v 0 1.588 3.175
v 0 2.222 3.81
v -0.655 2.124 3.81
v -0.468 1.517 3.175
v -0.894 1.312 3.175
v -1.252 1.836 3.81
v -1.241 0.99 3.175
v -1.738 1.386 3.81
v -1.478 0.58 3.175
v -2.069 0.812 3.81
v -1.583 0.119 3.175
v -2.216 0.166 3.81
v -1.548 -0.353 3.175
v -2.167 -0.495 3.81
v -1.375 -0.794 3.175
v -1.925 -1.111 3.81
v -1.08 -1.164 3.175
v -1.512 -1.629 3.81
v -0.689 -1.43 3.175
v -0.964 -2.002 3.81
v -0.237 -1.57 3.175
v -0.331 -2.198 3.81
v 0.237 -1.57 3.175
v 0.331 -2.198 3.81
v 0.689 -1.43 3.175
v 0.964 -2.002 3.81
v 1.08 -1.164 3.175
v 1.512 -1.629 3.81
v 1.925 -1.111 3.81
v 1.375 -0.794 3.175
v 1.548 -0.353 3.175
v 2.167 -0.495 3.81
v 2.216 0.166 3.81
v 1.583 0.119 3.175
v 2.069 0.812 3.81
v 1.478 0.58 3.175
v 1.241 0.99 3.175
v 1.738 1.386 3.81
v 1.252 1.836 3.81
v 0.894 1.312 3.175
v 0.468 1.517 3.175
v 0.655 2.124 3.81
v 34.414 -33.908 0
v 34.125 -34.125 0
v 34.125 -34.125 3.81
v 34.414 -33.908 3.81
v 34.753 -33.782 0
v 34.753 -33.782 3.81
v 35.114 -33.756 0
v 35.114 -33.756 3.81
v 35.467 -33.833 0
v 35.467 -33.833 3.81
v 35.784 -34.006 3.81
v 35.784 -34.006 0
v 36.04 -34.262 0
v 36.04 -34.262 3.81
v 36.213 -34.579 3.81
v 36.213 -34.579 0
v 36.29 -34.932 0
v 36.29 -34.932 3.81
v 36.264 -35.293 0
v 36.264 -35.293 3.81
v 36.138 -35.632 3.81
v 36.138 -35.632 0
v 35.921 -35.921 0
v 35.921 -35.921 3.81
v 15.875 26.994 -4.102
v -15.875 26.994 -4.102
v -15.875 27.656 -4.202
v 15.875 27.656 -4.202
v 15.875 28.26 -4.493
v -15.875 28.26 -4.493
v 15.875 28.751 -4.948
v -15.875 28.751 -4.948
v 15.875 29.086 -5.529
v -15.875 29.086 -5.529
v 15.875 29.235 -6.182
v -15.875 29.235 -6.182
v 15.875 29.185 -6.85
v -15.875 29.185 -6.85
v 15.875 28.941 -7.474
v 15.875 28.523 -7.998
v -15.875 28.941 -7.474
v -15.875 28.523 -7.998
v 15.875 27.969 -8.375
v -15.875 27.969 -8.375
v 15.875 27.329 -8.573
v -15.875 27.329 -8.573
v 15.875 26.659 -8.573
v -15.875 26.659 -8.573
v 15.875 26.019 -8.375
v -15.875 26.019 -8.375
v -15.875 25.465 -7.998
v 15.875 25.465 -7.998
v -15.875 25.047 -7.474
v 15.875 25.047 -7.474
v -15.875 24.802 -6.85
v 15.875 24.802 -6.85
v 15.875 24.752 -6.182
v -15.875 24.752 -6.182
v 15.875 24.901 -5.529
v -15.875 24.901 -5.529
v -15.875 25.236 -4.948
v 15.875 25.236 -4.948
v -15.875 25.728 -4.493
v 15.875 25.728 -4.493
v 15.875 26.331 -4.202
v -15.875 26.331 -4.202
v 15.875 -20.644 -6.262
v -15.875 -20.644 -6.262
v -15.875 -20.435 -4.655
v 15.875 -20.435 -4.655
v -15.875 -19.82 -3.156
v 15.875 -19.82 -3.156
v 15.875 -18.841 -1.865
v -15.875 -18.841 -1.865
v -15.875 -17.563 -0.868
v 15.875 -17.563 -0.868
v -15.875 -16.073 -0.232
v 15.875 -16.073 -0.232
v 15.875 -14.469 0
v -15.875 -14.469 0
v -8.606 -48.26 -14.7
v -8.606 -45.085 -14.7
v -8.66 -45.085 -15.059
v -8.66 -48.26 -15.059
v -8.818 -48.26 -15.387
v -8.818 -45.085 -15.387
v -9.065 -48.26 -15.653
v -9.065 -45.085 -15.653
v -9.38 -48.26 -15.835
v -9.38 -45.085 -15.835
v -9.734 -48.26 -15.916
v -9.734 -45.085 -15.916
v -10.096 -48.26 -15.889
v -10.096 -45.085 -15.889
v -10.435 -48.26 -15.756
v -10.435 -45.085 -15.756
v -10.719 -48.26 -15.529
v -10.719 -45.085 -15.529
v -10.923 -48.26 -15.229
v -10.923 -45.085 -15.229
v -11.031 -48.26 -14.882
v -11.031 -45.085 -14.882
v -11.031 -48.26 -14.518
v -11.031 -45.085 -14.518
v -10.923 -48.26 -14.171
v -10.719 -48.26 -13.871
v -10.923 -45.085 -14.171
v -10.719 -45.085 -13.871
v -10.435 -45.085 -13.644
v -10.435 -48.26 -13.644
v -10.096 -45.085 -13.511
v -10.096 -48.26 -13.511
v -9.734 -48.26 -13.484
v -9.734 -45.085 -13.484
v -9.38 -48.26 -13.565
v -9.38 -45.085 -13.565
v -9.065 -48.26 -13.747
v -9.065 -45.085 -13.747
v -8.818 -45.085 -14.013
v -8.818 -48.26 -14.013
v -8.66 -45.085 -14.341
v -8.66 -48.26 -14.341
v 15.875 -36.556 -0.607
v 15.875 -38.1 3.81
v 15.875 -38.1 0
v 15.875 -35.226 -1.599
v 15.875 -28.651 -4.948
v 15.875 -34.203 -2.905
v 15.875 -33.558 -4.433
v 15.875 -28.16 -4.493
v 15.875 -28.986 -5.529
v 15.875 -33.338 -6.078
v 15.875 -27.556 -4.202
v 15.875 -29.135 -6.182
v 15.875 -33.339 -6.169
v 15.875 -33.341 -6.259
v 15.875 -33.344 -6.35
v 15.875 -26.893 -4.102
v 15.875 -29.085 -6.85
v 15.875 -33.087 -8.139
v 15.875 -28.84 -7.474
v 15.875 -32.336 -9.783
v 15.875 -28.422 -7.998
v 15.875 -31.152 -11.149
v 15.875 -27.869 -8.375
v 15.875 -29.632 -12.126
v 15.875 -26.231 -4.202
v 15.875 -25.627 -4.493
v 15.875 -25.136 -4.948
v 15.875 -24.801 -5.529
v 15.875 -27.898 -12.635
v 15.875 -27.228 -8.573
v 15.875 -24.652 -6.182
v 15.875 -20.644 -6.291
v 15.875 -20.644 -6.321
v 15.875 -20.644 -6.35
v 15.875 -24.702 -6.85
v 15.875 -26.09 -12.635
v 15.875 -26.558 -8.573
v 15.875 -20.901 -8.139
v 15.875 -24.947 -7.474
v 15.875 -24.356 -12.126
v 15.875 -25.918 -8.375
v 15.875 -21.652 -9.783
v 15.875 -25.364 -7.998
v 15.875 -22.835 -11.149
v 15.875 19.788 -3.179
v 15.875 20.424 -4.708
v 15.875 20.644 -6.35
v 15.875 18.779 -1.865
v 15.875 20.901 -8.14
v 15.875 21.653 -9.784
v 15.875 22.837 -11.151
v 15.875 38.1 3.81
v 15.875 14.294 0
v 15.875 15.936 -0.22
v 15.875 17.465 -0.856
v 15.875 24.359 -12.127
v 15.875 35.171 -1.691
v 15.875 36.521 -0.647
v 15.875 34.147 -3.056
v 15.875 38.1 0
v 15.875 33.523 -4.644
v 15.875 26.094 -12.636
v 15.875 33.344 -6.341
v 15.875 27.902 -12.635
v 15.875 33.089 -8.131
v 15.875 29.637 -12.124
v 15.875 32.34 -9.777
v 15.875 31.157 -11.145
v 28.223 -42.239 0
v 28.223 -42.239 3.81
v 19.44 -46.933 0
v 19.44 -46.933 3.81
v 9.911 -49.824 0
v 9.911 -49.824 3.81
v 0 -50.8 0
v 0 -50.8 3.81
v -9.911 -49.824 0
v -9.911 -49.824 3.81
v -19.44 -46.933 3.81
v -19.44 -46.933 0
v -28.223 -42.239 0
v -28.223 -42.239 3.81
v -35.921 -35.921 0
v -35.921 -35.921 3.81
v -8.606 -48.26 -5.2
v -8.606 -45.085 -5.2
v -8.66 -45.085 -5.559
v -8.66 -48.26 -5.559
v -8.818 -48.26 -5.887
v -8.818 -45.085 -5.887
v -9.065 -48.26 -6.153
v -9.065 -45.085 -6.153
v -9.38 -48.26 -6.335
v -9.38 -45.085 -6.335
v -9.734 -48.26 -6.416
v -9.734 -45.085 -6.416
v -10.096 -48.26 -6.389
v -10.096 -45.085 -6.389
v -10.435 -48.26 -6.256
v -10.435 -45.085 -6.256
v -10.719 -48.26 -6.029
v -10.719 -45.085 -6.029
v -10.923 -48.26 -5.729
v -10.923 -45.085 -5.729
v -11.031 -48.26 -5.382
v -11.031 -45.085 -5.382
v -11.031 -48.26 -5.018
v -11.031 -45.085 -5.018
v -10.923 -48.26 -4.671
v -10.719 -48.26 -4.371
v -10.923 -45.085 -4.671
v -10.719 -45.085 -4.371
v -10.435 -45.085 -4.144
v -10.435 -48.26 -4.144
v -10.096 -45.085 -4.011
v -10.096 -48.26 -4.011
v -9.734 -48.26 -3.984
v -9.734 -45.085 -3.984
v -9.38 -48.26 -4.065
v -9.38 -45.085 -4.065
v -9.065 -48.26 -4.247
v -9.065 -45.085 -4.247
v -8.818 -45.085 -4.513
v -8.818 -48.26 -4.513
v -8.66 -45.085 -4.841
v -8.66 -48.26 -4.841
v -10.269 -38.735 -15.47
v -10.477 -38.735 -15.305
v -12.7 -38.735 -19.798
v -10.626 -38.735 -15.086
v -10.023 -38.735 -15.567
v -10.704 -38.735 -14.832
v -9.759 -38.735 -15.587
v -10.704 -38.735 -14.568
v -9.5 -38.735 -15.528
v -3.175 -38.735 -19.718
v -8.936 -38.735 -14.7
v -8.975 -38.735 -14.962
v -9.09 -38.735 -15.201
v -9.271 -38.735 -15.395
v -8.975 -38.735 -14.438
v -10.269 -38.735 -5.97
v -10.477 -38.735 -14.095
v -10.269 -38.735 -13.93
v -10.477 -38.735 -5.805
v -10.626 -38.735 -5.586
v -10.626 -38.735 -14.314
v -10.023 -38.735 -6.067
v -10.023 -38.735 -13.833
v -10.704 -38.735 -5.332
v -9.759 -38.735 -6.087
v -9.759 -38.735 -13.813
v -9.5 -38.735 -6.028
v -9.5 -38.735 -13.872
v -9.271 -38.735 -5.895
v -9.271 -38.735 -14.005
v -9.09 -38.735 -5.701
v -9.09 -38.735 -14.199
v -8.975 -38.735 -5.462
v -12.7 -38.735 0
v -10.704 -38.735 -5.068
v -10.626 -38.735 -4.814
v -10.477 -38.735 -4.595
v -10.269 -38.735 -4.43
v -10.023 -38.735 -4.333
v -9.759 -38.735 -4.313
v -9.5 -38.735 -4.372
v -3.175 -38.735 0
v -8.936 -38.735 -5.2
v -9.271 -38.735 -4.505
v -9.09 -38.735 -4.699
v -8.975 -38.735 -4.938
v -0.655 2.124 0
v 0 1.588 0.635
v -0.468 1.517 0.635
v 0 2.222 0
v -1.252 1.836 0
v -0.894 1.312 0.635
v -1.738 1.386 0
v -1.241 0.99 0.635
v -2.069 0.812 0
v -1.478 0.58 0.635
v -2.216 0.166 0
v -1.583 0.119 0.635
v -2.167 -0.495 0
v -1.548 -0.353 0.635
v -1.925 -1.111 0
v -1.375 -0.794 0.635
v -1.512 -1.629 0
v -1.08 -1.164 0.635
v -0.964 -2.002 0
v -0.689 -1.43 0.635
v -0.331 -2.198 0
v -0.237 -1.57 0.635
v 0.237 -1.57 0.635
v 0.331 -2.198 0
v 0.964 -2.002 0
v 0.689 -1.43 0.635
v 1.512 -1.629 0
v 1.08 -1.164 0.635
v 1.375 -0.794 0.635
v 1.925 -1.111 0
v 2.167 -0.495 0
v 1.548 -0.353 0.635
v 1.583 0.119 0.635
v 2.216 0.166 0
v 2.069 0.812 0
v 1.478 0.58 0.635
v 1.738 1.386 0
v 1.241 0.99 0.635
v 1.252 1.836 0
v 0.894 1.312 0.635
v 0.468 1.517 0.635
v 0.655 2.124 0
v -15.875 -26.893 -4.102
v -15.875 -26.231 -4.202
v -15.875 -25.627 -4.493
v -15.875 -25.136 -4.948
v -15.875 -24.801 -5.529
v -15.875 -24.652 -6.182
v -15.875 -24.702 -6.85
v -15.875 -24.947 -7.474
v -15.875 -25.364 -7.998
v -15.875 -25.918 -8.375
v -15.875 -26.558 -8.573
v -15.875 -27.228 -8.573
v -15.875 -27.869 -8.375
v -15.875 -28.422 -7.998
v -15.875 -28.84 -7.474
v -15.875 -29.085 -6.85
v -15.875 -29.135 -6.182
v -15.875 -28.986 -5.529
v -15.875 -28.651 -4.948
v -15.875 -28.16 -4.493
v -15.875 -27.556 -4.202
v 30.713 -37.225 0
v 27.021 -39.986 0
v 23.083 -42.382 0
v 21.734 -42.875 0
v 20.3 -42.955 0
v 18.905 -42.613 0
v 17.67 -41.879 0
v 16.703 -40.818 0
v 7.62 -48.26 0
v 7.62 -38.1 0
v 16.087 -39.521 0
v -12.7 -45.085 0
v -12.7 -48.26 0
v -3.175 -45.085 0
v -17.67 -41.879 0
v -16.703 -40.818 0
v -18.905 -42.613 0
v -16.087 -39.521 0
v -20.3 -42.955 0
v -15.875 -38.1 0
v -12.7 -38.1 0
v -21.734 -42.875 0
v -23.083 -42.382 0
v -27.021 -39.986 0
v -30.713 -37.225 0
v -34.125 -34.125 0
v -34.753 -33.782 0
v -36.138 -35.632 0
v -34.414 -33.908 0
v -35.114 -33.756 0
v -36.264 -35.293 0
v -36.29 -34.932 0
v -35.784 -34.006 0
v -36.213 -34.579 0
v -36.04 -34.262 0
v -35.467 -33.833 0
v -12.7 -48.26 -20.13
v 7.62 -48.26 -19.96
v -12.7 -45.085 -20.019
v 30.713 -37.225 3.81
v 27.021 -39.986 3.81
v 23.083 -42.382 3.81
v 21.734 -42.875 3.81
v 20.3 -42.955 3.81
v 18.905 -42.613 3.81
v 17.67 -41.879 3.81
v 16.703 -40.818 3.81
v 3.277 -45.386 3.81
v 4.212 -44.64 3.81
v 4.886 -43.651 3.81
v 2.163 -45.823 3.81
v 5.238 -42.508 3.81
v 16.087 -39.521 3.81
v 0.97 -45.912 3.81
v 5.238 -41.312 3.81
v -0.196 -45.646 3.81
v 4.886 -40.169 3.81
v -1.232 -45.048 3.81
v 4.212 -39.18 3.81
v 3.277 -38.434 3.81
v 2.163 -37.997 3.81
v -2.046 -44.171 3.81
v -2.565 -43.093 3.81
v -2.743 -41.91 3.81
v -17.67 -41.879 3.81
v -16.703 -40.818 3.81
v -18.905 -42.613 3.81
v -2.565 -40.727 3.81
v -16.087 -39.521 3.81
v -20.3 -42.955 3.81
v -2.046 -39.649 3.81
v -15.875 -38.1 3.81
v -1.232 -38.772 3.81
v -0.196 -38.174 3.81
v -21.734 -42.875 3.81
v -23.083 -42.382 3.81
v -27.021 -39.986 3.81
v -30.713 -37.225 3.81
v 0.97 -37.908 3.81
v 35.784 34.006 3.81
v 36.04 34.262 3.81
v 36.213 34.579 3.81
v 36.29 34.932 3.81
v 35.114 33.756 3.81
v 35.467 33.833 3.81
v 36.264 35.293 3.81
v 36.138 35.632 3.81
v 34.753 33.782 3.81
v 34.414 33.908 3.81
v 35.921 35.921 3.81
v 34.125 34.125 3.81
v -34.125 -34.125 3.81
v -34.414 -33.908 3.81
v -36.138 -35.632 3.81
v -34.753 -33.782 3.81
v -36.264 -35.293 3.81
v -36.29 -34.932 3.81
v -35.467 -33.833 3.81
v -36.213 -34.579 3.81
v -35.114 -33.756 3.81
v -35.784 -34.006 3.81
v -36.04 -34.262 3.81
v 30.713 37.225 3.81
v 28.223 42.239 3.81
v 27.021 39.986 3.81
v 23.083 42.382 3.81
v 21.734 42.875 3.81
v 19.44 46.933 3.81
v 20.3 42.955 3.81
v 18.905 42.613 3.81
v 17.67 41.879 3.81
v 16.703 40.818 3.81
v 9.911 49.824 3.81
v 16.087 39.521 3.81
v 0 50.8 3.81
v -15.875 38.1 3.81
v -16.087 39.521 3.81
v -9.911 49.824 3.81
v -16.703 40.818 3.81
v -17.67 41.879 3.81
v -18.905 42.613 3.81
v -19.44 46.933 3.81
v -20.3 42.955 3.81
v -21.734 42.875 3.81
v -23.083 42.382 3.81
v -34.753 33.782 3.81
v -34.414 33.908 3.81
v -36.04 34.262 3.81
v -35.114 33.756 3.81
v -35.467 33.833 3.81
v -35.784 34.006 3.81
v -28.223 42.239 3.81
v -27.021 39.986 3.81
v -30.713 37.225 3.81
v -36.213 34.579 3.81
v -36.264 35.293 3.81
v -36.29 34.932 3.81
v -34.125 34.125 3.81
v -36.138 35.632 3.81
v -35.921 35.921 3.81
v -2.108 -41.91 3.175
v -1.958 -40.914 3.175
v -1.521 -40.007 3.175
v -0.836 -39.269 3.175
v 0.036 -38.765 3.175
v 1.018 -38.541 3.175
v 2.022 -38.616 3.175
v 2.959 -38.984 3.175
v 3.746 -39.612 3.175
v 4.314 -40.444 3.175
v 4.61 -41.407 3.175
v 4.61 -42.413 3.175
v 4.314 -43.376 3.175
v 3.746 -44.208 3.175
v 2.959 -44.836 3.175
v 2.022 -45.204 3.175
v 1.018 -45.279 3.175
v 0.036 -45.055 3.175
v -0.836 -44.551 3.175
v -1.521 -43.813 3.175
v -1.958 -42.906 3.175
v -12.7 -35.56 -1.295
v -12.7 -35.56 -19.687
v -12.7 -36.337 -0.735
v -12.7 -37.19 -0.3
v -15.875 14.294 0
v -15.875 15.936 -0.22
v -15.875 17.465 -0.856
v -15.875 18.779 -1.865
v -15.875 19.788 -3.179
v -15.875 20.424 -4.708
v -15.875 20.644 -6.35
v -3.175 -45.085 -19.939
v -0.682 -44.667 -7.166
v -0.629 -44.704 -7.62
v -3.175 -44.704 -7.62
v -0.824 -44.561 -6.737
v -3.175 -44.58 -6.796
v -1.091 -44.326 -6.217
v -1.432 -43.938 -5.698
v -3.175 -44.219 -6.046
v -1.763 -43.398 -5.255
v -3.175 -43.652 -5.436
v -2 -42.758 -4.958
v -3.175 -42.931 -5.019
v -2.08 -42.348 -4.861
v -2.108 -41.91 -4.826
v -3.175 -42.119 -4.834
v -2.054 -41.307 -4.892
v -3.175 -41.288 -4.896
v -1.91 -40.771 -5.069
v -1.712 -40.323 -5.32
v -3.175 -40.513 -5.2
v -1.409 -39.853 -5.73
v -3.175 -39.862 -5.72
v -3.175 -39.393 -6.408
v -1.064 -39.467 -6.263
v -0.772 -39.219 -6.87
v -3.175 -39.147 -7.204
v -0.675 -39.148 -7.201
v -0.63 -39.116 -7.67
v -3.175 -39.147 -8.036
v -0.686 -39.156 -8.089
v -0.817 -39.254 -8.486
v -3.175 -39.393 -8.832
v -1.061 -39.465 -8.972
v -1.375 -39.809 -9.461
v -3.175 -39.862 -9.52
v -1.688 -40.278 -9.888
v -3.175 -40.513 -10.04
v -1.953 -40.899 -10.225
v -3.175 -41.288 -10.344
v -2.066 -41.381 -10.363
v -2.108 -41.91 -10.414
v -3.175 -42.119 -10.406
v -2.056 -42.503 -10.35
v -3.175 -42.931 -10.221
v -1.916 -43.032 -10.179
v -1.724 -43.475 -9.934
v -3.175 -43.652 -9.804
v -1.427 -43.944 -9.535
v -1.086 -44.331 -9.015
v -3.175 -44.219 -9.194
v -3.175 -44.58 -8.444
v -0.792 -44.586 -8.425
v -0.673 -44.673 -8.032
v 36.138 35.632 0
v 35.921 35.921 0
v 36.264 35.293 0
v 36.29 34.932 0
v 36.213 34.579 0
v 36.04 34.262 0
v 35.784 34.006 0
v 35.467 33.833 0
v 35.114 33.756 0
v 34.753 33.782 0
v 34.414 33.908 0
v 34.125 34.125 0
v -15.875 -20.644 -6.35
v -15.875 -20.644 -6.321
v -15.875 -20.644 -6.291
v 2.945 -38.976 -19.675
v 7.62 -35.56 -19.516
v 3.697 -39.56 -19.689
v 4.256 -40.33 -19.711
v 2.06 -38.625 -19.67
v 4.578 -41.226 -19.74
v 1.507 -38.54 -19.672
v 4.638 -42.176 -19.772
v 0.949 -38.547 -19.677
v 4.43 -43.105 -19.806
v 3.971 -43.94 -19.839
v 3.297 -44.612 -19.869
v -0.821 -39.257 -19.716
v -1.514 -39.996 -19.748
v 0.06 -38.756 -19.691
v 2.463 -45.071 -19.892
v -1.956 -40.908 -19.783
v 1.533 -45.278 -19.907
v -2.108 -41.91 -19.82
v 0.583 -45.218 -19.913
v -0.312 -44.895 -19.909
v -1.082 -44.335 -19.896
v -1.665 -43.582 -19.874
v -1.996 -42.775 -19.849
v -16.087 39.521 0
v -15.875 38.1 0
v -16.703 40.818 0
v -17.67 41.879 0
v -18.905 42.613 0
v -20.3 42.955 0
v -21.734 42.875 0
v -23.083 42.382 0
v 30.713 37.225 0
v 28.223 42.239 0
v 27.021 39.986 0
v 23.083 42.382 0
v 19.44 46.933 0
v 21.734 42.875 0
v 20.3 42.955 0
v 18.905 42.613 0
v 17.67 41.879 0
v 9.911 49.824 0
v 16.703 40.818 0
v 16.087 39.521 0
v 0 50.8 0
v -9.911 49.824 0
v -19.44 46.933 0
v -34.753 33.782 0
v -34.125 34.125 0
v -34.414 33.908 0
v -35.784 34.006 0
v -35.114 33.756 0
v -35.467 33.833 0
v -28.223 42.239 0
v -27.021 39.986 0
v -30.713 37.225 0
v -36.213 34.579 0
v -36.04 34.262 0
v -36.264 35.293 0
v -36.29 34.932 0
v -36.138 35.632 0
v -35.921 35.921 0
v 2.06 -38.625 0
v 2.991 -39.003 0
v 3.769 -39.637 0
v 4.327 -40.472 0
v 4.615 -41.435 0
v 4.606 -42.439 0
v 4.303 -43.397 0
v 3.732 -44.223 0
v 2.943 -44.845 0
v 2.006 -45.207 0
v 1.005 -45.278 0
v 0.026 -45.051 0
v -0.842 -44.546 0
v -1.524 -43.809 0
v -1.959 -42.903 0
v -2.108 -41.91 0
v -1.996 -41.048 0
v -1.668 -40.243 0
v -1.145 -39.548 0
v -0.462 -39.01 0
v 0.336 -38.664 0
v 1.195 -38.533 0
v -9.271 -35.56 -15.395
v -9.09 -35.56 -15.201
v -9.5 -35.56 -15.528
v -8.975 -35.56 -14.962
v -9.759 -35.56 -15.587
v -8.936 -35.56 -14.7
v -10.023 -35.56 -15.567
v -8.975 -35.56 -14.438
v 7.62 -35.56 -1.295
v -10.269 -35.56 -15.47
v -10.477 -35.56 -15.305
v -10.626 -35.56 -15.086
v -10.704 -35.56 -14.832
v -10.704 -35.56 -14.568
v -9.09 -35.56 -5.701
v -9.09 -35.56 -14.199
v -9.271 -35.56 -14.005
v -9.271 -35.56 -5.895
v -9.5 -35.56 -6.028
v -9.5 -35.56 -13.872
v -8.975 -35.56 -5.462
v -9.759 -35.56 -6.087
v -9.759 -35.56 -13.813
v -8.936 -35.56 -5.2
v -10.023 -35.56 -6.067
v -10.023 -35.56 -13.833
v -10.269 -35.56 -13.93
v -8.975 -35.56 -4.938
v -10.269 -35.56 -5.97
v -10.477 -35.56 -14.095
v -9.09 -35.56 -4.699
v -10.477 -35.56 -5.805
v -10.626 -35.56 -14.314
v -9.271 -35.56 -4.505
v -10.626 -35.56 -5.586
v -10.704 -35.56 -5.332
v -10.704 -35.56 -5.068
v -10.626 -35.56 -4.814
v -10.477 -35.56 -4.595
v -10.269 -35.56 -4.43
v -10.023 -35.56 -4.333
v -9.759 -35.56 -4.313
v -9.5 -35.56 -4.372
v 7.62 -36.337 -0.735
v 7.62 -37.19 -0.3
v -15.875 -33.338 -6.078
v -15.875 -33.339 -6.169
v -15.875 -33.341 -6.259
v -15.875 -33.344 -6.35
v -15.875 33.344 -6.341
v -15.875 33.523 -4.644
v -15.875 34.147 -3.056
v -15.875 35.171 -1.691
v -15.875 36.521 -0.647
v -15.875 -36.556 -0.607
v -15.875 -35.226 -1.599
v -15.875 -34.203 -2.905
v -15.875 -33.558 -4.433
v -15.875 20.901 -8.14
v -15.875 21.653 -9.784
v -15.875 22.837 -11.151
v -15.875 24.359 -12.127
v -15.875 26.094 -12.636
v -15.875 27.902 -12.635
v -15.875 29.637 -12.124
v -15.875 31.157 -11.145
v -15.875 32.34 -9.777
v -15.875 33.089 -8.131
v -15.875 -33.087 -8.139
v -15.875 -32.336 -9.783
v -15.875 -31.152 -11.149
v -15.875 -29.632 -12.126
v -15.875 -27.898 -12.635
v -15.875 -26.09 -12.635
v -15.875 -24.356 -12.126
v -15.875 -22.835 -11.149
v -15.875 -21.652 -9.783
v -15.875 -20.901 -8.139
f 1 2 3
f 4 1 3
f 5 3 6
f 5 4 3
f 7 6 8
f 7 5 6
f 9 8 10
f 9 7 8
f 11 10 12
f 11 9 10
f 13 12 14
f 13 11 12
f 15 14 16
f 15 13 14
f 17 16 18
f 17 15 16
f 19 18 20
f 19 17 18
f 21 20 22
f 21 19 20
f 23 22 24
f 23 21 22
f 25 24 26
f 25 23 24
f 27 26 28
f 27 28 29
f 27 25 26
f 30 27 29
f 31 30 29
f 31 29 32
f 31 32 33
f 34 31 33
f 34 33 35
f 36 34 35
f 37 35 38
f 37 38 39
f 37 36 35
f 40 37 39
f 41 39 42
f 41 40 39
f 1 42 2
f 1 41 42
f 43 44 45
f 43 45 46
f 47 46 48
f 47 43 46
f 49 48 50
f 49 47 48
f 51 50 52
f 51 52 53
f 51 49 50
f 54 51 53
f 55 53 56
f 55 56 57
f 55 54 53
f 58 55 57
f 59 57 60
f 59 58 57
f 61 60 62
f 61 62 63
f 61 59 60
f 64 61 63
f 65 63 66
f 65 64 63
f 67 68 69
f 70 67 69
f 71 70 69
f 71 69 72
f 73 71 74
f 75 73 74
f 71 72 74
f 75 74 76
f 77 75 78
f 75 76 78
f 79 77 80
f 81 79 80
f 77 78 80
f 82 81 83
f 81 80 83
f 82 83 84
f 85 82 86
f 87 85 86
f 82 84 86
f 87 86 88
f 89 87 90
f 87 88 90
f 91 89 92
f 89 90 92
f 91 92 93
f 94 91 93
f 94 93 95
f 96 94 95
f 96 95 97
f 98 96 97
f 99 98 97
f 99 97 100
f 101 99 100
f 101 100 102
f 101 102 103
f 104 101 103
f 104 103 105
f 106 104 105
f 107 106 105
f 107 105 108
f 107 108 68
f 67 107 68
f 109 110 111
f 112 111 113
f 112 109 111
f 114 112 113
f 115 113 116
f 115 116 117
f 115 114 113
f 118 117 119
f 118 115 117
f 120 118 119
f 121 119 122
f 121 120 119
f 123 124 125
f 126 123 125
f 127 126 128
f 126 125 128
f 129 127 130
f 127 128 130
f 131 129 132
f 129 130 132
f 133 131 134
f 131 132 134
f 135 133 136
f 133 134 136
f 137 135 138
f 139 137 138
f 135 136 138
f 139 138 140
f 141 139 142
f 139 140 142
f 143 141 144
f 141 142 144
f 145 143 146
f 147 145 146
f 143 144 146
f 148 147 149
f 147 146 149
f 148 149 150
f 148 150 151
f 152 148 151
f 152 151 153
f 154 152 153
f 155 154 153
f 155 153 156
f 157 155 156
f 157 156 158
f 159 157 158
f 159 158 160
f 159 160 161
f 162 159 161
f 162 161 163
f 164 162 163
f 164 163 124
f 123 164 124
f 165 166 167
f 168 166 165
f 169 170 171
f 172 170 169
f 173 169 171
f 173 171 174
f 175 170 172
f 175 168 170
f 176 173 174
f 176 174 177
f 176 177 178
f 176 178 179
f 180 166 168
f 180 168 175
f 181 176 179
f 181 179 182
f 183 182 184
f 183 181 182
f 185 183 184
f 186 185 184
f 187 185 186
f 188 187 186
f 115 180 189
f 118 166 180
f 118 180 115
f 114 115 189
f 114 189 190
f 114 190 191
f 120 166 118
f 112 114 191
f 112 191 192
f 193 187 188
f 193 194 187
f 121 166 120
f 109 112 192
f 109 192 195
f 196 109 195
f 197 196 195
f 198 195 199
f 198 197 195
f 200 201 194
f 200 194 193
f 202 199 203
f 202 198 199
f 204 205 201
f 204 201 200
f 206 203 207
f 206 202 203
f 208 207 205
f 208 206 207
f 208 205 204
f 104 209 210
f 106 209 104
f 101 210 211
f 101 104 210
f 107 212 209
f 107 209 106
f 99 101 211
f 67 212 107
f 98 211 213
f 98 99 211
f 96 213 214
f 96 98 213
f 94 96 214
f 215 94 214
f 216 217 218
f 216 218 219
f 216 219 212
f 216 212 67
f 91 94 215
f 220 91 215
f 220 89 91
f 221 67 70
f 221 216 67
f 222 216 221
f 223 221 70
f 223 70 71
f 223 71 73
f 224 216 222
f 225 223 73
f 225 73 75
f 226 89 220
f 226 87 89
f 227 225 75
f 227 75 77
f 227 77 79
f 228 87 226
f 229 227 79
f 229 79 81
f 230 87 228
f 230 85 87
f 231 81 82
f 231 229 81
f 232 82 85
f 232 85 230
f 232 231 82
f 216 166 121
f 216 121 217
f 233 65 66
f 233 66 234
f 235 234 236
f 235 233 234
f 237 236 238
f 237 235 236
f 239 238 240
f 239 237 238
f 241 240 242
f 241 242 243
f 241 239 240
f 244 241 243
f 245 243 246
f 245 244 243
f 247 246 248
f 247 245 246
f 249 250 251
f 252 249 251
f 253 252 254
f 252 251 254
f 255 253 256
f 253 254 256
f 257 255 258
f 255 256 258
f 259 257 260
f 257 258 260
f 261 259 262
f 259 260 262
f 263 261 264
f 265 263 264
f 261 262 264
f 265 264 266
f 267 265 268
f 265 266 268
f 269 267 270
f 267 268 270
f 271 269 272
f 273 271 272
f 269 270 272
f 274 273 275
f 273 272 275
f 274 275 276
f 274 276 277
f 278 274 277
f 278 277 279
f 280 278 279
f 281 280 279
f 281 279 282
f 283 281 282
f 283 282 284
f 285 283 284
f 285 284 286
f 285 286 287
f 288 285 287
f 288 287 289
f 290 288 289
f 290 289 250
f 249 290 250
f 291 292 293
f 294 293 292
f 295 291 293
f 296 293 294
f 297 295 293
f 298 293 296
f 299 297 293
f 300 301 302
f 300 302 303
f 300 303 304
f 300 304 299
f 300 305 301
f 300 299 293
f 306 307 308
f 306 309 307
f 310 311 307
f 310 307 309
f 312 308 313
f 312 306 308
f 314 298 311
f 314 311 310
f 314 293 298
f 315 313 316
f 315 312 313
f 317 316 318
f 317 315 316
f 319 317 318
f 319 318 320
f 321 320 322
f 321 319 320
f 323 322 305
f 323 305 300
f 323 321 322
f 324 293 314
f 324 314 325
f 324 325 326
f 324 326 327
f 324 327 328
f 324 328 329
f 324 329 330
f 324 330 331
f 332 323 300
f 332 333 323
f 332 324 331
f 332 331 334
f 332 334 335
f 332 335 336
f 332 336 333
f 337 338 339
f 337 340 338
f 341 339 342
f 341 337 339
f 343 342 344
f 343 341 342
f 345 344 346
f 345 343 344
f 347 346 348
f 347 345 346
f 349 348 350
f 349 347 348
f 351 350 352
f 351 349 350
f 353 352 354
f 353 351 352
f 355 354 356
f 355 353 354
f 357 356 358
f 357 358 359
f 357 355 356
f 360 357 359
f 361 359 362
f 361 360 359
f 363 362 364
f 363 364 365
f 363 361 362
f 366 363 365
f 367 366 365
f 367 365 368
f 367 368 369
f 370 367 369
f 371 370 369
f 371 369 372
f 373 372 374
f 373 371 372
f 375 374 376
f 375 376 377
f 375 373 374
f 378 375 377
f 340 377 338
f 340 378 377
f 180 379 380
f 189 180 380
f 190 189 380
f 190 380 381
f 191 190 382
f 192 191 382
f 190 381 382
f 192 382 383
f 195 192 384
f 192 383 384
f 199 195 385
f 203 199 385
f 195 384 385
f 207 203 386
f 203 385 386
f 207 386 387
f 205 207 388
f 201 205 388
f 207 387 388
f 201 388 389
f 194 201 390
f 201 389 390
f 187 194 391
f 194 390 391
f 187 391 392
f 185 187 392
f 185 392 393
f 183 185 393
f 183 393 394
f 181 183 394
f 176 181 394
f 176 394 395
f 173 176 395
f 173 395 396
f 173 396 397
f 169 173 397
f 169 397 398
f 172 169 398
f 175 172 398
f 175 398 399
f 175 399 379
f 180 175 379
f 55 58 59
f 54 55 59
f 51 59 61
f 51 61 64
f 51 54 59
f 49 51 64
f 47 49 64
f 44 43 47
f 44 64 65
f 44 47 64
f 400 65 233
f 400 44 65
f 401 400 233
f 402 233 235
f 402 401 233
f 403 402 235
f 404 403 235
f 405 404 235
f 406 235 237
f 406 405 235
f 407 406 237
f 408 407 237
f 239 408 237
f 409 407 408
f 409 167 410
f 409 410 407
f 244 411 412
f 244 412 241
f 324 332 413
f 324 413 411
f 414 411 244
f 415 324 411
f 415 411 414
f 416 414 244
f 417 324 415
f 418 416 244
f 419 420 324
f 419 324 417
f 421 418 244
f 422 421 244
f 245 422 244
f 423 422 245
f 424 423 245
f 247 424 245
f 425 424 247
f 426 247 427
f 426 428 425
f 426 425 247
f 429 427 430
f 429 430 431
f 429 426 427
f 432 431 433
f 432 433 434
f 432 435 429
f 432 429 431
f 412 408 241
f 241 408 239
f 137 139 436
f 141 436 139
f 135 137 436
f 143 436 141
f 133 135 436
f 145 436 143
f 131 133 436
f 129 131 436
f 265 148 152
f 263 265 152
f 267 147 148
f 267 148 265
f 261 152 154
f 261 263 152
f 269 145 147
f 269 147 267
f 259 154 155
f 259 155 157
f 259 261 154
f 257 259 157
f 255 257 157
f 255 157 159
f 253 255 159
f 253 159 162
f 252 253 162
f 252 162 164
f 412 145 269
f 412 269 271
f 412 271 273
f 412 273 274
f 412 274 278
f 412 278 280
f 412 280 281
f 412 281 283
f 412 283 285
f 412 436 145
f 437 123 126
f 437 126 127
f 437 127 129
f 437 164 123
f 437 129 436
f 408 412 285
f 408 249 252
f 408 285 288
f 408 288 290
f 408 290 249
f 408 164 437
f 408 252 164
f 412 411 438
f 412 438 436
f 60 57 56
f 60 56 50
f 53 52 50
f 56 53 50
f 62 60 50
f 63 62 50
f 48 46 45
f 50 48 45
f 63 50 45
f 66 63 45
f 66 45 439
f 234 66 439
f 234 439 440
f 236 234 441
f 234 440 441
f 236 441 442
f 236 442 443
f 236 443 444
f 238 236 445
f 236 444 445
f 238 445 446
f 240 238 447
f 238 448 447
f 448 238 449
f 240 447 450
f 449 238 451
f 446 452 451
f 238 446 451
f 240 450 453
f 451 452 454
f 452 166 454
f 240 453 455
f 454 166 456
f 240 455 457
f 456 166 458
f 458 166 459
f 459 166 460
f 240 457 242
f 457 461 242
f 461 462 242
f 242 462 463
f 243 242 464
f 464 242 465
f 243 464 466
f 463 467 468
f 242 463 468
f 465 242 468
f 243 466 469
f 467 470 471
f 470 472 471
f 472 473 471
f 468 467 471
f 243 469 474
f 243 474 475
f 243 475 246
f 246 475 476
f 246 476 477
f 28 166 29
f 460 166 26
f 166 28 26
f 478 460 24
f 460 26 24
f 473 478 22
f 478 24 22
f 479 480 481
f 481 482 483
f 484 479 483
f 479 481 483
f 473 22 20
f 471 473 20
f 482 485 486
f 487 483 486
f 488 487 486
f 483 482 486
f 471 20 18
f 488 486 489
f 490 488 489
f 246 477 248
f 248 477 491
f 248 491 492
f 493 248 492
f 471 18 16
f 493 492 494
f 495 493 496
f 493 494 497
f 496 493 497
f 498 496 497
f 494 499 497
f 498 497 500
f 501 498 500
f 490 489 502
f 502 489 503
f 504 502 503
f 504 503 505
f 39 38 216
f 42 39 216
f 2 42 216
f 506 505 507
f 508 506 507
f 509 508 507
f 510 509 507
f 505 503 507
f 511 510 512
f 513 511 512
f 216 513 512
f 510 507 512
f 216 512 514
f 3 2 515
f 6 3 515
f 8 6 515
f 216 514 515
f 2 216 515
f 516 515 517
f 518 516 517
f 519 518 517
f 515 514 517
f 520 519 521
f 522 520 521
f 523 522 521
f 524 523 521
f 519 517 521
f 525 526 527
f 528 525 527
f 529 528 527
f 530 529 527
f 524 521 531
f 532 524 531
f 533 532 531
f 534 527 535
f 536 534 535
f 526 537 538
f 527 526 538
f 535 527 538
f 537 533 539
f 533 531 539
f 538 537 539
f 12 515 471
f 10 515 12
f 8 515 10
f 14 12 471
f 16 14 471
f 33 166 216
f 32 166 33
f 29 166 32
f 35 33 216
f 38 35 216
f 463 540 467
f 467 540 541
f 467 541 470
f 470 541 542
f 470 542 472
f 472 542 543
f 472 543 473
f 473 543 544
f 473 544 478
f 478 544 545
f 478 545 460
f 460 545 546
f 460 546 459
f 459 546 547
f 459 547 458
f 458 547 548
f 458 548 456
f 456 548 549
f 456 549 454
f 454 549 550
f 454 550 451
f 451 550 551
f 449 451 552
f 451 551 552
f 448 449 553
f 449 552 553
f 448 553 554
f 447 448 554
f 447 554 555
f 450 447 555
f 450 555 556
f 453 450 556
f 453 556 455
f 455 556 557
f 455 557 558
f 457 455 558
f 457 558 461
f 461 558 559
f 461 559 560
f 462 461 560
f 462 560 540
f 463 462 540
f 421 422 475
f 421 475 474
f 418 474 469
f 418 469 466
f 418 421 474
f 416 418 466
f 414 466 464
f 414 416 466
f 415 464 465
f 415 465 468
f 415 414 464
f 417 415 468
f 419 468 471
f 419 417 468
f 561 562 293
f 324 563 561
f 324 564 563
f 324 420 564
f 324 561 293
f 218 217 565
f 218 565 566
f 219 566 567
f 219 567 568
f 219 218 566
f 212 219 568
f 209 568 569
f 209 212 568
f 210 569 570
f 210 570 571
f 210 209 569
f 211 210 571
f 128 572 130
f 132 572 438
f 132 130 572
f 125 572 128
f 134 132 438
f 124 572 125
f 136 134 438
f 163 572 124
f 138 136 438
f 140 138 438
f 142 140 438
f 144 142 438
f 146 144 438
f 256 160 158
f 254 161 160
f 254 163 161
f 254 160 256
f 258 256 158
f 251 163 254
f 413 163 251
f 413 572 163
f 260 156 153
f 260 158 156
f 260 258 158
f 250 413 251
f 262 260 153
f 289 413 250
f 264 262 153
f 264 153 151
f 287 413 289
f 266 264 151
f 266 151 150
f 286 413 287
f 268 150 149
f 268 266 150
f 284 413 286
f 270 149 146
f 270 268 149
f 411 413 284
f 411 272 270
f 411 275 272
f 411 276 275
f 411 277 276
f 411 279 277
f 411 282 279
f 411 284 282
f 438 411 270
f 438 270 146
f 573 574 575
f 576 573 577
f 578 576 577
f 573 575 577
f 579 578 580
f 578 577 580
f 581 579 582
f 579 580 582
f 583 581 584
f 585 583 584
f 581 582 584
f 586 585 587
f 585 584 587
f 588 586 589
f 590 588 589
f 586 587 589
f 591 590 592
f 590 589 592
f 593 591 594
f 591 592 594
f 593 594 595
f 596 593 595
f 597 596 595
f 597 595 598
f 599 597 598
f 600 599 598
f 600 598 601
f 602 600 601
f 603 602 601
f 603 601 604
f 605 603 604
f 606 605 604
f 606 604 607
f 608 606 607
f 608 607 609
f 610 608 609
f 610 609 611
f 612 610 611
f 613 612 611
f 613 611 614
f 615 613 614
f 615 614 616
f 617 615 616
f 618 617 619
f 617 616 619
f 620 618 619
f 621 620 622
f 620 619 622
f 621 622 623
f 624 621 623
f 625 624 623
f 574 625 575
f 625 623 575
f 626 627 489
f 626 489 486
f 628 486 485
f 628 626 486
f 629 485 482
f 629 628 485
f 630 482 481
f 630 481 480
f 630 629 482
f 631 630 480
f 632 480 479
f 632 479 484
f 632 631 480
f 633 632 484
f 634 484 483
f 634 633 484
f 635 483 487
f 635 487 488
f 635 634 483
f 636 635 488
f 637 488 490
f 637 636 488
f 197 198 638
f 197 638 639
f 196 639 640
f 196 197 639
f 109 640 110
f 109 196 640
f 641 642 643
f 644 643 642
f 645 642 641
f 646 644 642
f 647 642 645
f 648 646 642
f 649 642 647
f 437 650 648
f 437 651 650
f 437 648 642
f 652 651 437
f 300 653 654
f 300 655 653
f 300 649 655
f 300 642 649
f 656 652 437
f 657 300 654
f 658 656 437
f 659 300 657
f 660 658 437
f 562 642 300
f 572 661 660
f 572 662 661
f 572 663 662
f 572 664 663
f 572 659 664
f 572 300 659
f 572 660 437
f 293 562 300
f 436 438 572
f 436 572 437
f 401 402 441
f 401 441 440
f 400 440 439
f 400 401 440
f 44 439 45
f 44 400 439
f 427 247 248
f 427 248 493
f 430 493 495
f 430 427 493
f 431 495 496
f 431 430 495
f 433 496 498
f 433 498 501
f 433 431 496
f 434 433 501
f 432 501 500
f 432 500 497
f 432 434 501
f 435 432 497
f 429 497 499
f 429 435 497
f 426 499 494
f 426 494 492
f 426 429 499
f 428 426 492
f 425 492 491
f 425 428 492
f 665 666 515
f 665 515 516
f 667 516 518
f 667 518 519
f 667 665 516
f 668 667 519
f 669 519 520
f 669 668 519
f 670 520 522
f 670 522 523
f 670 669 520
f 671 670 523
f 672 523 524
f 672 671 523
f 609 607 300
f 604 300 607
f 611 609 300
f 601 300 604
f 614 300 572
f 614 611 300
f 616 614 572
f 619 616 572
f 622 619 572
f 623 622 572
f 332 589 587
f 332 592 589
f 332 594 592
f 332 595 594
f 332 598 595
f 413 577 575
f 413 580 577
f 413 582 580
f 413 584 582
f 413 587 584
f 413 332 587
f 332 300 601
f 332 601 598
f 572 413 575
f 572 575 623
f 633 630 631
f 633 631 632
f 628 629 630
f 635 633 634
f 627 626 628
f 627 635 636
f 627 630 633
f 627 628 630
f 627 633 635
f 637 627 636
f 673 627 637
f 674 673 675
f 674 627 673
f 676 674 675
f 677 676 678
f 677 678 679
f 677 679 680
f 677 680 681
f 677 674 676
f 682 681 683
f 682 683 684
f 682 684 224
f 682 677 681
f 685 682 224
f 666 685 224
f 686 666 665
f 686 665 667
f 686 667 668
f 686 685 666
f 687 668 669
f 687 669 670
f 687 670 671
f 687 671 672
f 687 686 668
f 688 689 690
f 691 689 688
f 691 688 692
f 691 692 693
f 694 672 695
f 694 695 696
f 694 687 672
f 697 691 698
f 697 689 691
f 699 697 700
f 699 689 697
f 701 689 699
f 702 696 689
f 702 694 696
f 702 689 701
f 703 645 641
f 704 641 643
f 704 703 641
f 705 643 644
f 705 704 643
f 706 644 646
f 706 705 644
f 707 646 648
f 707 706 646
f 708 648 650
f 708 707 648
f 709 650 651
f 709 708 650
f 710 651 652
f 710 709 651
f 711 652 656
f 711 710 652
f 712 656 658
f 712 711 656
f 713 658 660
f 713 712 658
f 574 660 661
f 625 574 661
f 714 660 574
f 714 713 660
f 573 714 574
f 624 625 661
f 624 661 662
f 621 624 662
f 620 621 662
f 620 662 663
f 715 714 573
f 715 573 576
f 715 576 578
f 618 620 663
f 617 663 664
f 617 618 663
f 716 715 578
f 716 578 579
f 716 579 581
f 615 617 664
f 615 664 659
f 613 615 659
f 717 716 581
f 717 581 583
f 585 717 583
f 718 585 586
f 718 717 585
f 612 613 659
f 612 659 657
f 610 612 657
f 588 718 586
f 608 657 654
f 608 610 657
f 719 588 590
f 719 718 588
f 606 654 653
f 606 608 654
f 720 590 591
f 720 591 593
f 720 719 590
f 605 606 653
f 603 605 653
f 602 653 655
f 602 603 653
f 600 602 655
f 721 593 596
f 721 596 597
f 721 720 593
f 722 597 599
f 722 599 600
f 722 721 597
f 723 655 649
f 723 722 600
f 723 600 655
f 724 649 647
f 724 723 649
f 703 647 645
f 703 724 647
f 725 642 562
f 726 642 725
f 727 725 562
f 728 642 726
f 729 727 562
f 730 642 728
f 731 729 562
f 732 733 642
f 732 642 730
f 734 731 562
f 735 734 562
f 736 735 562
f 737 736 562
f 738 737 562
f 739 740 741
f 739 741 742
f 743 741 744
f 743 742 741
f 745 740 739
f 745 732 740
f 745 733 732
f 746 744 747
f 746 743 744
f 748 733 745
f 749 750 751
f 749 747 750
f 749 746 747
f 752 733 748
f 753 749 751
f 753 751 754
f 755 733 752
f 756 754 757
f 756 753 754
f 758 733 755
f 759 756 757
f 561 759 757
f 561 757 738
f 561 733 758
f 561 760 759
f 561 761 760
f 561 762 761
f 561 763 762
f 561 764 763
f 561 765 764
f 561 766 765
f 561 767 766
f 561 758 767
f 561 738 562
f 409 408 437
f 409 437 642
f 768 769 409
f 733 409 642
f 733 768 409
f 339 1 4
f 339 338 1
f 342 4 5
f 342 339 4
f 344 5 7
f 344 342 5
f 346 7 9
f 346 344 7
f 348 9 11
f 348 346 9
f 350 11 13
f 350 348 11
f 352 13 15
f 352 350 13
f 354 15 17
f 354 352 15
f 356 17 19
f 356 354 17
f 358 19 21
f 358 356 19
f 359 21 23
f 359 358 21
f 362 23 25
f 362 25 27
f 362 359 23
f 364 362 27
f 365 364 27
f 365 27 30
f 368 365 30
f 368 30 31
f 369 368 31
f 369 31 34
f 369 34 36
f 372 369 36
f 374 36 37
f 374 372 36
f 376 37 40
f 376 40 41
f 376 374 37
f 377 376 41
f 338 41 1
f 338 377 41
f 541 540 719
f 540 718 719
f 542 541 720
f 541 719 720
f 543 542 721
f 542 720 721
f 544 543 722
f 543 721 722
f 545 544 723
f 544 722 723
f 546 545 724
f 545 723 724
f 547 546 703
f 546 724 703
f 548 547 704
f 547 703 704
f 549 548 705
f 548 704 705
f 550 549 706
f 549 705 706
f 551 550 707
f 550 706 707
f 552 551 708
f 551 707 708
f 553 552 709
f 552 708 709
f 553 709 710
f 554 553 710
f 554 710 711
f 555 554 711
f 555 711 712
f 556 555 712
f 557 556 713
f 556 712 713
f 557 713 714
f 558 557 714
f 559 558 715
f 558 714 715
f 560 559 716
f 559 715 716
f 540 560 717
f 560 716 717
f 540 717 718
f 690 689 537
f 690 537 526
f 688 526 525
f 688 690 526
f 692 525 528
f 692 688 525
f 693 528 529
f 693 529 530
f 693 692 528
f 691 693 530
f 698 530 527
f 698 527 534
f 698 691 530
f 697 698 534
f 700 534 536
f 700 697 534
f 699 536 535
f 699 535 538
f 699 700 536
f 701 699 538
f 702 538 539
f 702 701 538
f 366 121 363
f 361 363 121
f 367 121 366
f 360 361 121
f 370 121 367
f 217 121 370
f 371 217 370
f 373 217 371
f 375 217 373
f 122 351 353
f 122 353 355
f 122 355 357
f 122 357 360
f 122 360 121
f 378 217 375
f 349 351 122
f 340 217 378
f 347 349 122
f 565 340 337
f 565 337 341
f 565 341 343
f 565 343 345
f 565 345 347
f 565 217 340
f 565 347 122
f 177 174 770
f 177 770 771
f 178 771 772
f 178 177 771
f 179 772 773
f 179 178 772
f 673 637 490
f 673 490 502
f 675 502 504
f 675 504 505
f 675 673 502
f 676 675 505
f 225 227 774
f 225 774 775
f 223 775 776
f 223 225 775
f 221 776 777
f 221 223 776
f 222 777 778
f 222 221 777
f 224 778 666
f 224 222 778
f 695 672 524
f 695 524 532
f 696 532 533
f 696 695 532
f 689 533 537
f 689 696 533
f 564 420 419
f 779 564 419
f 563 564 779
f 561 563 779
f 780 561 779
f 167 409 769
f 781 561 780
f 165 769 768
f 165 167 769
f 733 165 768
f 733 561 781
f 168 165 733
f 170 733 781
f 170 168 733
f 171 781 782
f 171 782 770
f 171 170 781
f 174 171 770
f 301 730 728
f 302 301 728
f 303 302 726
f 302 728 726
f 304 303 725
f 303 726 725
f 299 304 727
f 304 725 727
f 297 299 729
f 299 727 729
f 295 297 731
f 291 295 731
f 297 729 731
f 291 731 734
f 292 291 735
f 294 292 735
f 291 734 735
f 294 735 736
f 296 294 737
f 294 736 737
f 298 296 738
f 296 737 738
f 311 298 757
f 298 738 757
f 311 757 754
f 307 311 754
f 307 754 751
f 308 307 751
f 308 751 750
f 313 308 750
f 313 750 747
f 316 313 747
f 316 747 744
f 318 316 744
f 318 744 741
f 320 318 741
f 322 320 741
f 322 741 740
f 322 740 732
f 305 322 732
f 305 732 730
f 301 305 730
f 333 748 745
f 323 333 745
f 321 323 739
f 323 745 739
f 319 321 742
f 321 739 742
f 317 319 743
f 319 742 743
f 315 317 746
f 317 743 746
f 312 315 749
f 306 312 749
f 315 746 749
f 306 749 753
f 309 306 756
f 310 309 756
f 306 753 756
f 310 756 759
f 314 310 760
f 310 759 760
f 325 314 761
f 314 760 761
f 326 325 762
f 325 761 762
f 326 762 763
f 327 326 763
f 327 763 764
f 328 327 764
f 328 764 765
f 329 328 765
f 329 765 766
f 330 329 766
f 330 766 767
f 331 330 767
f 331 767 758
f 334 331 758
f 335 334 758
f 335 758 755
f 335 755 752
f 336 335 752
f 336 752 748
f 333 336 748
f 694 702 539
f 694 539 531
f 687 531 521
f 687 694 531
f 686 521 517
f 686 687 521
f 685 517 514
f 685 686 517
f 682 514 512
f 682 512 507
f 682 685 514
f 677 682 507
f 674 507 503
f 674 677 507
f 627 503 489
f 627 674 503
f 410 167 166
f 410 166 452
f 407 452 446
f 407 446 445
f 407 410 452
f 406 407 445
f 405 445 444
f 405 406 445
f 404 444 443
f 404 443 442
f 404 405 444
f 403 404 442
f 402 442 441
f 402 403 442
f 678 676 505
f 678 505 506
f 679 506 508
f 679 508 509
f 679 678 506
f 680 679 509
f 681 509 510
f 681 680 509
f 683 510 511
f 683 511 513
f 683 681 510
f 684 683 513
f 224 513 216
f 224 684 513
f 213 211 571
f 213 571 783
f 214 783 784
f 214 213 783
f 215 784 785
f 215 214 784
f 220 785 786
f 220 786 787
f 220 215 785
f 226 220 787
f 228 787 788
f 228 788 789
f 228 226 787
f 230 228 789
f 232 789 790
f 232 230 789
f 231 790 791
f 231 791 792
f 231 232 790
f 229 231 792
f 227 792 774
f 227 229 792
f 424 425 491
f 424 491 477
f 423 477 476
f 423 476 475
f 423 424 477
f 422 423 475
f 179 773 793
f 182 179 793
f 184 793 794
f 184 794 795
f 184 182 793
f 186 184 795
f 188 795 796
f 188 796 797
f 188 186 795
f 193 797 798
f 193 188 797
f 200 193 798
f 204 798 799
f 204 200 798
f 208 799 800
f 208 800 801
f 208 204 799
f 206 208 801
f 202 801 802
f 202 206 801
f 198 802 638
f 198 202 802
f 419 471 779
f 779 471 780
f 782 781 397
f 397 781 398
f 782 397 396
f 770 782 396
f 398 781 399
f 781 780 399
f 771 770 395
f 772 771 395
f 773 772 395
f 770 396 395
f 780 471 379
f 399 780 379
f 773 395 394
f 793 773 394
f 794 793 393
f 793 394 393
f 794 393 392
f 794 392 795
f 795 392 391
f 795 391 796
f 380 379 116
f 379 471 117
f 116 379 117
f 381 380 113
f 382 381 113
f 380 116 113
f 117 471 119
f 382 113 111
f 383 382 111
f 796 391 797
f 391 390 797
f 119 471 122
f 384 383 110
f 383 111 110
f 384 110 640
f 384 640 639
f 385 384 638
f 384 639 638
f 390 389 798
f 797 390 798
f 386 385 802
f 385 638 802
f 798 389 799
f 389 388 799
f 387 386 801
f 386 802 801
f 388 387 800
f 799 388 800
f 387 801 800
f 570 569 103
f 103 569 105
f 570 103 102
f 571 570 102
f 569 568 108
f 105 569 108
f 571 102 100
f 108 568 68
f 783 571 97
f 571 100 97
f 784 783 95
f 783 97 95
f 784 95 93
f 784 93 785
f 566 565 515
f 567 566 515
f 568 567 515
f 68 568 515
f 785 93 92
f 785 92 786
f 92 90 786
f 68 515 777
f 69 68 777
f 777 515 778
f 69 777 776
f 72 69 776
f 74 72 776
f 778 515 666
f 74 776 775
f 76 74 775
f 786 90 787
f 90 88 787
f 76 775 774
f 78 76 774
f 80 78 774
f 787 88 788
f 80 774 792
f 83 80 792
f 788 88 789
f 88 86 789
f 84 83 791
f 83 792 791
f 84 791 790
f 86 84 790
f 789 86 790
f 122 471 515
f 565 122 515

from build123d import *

# Parameters (mm, degrees)
BOSS_EXTRUDE2_DEPTH               = 3.81
BOSS_EXTRUDE4_DEPTH               = 31.75
F_8_CLEARANCE_HOLE1_D             = 4.4958
BOSS_EXTRUDE7_REACH               = 65.711
SKETCH19_R                        = 3.3782
F_1_4_CLEARANCE_HOLE3_D           = 6.7564
F_1_4_CLEARANCE_HOLE3_CSINK_D     = 8.0264
F_1_4_CLEARANCE_HOLE3_CSINK_ANGLE = 90
SKETCH25_R                        = 2.794
CUT_EXTRUDE1_DEPTH                = 3.81
F_2_CLEARANCE_HOLE1_D             = 2.4384
F_2_CLEARANCE_HOLE1_DEPTH         = 3.175
TAP_DRILL_FOR_2_56_TAP1_D         = 1.778
TAP_DRILL_FOR_2_56_TAP1_DEPTH     = 12.7


with BuildPart() as part:
    # Sketch3 → Boss-Extrude2 (new body)
    with BuildSketch(Plane.XY):
        with BuildLine():
            Line((-15.875, -38.1), (-15.875, 38.1))
            ThreePointArc((-15.875, 38.1), (-18.260491841, 42.291797068), (-23.082694008, 42.38179842))
            ThreePointArc((-23.082694008, 42.38179842), (-28.900226452, 38.649767283), (-34.12497326, 34.12497326))
            ThreePointArc((-34.12497326, 34.12497326), (-35.921024484, 34.12497326), (-35.921024484, 35.921024484))
            ThreePointArc((-35.921024484, 35.921024484), (0, 50.8), (35.921024484, 35.921024484))
            ThreePointArc((35.921024484, 35.921024484), (35.921024484, 34.12497326), (34.12497326, 34.12497326))
            ThreePointArc((34.12497326, 34.12497326), (28.900226452, 38.649767283), (23.082694008, 42.38179842))
            ThreePointArc((23.082694008, 42.38179842), (18.260491841, 42.291797068), (15.875, 38.1))
            Line((15.875, 38.1), (15.875, -38.1))
            ThreePointArc((15.875, -38.1), (18.260491841, -42.291797068), (23.082694008, -42.38179842))
            ThreePointArc((23.082694008, -42.38179842), (28.900226452, -38.649767283), (34.12497326, -34.12497326))
            ThreePointArc((34.12497326, -34.12497326), (35.921024484, -34.12497326), (35.921024484, -35.921024484))
            ThreePointArc((35.921024484, -35.921024484), (0, -50.8), (-35.921024484, -35.921024484))
            ThreePointArc((-35.921024484, -35.921024484), (-35.921024484, -34.12497326), (-34.12497326, -34.12497326))
            ThreePointArc((-34.12497326, -34.12497326), (-28.900226452, -38.649767283), (-23.082694008, -42.38179842))
            ThreePointArc((-23.082694008, -42.38179842), (-18.260491841, -42.291797068), (-15.875, -38.1))
        make_face()
    extrude(amount=BOSS_EXTRUDE2_DEPTH)

    # Sketch5 → Boss-Extrude4 (add)
    with BuildSketch(Plane(origin=(15.875, 0, 0), x_dir=(0, 0, -1), z_dir=(1, 0, 0))):
        with BuildLine():
            Line((0, 38.1), (0, 26.99385))
            Line((0, 26.99385), (0, 14.29385))
            ThreePointArc((0, 14.29385), (1.86498297, 18.77886703), (6.35, 20.64385))
            ThreePointArc((6.35, 20.64385), (12.699998494, 26.998224058), (6.341251887, 33.343843974))
            ThreePointArc((6.341251887, 33.343843974), (2.338844583, 34.612930799), (0, 38.1))
        make_face()
        with BuildLine():
            ThreePointArc((6.261703048, -20.644463916), (1.864650947, -18.840779739), (0, -14.469233029))
            Line((0, -14.469233029), (0, -26.99385))
            Line((0, -26.99385), (0, -38.1))
            ThreePointArc((0, -38.1), (2.217611083, -34.670801888), (6.077775616, -33.338012189))
            ThreePointArc((6.077775616, -33.338012189), (6.213919542, -33.33945129), (6.35, -33.34385))
            ThreePointArc((6.35, -33.34385), (12.7, -26.99385), (6.35, -20.64385))
            ThreePointArc((6.35, -20.64385), (6.305852606, -20.644312569), (6.261703048, -20.644463916))
        make_face()
    extrude(amount=-BOSS_EXTRUDE4_DEPTH)

    # #8 Clearance Hole1 (through all)
    with Locations(Plane(origin=(15.875, 0, 0), x_dir=(0, 0, -1), z_dir=(1, 0, 0))):
        with Locations((6.35, 26.99385), (6.35, -26.893399733)):
            Hole(F_8_CLEARANCE_HOLE1_D / 2)

    # Sketch10 → 1/8 (0.125) Diameter Hole1 (revolve, cut)
    with BuildSketch(Plane.YZ):
        Polygon((0, 0), (0, 3.81), (2.2225, 3.81), (1.5875, 3.175), (1.5875, 0.635), (2.2225, 0), align=None)
    revolve(axis=Axis((0, 0, -6.35), (0, 0, 1)), mode=Mode.SUBTRACT)

    # Boss-Extrude7: up to this plane
    boss_extrude7_end = Plane(origin=(-3.551630422, -38.686979812, -19.719207275), z_dir=(0.008390733100517729, 0.03489949670250099, -0.9993556027400597))
    # Sketch19 → Boss-Extrude7 (add, up to the surface)
    with BuildSketch(Plane(origin=(0, 0, 0), x_dir=(-1, 0, 0), z_dir=(0, 0, -1)), mode=Mode.PRIVATE) as boss_extrude7_sk1:
        Polygon((12.7, -38.735), (3.175, -38.735), (3.175, -45.085), (12.7, -45.085), (12.7, -48.26), (-7.62, -48.26), (-7.62, -35.56), (12.7, -35.56), align=None)
        with Locations(Location((-1.27, -41.91, 0), (0, 0, 103.518789087))):
            Circle(SKETCH19_R, mode=Mode.SUBTRACT)
    boss_extrude7_tool1 = split(extrude(boss_extrude7_sk1.sketch, amount=BOSS_EXTRUDE7_REACH, mode=Mode.PRIVATE), bisect_by=boss_extrude7_end, keep=Keep.BOTH, mode=Mode.PRIVATE)
    add(boss_extrude7_tool1.solids().sort_by_distance((-7.9375, -38.495377, 0))[0])

    # 1/4 Clearance Hole3 (through all)
    with Locations(Plane.XY.offset(3.81)):
        with Locations((1.27, -41.91)):
            CounterSinkHole(F_1_4_CLEARANCE_HOLE3_D / 2, F_1_4_CLEARANCE_HOLE3_CSINK_D / 2, counter_sink_angle=F_1_4_CLEARANCE_HOLE3_CSINK_ANGLE)

    # Sketch25 → Cut-Extrude1 (cut)
    with BuildSketch(Plane.ZY.offset(3.175)):
        with Locations(Location((-7.62, -41.91, 0), (0, 0, 270))):
            Circle(SKETCH25_R)
    extrude(amount=-CUT_EXTRUDE1_DEPTH, mode=Mode.SUBTRACT)

    # #2 Clearance Hole1
    with Locations(Plane(origin=(0, -48.26, 0), x_dir=(-1, 0, 0), z_dir=(0, -1, 0))):
        with Locations((9.825, 14.7), (9.825, 5.2)):
            Hole(F_2_CLEARANCE_HOLE1_D / 2, depth=F_2_CLEARANCE_HOLE1_DEPTH)

    # Tap Drill for #2-56 Tap1
    with Locations(Plane(origin=(0, -48.26, 0), x_dir=(-1, 0, 0), z_dir=(0, -1, 0))):
        with Locations((9.825, 14.7), (9.825, 5.2)):
            Hole(TAP_DRILL_FOR_2_56_TAP1_D / 2, depth=TAP_DRILL_FOR_2_56_TAP1_DEPTH)


solid = part.part
